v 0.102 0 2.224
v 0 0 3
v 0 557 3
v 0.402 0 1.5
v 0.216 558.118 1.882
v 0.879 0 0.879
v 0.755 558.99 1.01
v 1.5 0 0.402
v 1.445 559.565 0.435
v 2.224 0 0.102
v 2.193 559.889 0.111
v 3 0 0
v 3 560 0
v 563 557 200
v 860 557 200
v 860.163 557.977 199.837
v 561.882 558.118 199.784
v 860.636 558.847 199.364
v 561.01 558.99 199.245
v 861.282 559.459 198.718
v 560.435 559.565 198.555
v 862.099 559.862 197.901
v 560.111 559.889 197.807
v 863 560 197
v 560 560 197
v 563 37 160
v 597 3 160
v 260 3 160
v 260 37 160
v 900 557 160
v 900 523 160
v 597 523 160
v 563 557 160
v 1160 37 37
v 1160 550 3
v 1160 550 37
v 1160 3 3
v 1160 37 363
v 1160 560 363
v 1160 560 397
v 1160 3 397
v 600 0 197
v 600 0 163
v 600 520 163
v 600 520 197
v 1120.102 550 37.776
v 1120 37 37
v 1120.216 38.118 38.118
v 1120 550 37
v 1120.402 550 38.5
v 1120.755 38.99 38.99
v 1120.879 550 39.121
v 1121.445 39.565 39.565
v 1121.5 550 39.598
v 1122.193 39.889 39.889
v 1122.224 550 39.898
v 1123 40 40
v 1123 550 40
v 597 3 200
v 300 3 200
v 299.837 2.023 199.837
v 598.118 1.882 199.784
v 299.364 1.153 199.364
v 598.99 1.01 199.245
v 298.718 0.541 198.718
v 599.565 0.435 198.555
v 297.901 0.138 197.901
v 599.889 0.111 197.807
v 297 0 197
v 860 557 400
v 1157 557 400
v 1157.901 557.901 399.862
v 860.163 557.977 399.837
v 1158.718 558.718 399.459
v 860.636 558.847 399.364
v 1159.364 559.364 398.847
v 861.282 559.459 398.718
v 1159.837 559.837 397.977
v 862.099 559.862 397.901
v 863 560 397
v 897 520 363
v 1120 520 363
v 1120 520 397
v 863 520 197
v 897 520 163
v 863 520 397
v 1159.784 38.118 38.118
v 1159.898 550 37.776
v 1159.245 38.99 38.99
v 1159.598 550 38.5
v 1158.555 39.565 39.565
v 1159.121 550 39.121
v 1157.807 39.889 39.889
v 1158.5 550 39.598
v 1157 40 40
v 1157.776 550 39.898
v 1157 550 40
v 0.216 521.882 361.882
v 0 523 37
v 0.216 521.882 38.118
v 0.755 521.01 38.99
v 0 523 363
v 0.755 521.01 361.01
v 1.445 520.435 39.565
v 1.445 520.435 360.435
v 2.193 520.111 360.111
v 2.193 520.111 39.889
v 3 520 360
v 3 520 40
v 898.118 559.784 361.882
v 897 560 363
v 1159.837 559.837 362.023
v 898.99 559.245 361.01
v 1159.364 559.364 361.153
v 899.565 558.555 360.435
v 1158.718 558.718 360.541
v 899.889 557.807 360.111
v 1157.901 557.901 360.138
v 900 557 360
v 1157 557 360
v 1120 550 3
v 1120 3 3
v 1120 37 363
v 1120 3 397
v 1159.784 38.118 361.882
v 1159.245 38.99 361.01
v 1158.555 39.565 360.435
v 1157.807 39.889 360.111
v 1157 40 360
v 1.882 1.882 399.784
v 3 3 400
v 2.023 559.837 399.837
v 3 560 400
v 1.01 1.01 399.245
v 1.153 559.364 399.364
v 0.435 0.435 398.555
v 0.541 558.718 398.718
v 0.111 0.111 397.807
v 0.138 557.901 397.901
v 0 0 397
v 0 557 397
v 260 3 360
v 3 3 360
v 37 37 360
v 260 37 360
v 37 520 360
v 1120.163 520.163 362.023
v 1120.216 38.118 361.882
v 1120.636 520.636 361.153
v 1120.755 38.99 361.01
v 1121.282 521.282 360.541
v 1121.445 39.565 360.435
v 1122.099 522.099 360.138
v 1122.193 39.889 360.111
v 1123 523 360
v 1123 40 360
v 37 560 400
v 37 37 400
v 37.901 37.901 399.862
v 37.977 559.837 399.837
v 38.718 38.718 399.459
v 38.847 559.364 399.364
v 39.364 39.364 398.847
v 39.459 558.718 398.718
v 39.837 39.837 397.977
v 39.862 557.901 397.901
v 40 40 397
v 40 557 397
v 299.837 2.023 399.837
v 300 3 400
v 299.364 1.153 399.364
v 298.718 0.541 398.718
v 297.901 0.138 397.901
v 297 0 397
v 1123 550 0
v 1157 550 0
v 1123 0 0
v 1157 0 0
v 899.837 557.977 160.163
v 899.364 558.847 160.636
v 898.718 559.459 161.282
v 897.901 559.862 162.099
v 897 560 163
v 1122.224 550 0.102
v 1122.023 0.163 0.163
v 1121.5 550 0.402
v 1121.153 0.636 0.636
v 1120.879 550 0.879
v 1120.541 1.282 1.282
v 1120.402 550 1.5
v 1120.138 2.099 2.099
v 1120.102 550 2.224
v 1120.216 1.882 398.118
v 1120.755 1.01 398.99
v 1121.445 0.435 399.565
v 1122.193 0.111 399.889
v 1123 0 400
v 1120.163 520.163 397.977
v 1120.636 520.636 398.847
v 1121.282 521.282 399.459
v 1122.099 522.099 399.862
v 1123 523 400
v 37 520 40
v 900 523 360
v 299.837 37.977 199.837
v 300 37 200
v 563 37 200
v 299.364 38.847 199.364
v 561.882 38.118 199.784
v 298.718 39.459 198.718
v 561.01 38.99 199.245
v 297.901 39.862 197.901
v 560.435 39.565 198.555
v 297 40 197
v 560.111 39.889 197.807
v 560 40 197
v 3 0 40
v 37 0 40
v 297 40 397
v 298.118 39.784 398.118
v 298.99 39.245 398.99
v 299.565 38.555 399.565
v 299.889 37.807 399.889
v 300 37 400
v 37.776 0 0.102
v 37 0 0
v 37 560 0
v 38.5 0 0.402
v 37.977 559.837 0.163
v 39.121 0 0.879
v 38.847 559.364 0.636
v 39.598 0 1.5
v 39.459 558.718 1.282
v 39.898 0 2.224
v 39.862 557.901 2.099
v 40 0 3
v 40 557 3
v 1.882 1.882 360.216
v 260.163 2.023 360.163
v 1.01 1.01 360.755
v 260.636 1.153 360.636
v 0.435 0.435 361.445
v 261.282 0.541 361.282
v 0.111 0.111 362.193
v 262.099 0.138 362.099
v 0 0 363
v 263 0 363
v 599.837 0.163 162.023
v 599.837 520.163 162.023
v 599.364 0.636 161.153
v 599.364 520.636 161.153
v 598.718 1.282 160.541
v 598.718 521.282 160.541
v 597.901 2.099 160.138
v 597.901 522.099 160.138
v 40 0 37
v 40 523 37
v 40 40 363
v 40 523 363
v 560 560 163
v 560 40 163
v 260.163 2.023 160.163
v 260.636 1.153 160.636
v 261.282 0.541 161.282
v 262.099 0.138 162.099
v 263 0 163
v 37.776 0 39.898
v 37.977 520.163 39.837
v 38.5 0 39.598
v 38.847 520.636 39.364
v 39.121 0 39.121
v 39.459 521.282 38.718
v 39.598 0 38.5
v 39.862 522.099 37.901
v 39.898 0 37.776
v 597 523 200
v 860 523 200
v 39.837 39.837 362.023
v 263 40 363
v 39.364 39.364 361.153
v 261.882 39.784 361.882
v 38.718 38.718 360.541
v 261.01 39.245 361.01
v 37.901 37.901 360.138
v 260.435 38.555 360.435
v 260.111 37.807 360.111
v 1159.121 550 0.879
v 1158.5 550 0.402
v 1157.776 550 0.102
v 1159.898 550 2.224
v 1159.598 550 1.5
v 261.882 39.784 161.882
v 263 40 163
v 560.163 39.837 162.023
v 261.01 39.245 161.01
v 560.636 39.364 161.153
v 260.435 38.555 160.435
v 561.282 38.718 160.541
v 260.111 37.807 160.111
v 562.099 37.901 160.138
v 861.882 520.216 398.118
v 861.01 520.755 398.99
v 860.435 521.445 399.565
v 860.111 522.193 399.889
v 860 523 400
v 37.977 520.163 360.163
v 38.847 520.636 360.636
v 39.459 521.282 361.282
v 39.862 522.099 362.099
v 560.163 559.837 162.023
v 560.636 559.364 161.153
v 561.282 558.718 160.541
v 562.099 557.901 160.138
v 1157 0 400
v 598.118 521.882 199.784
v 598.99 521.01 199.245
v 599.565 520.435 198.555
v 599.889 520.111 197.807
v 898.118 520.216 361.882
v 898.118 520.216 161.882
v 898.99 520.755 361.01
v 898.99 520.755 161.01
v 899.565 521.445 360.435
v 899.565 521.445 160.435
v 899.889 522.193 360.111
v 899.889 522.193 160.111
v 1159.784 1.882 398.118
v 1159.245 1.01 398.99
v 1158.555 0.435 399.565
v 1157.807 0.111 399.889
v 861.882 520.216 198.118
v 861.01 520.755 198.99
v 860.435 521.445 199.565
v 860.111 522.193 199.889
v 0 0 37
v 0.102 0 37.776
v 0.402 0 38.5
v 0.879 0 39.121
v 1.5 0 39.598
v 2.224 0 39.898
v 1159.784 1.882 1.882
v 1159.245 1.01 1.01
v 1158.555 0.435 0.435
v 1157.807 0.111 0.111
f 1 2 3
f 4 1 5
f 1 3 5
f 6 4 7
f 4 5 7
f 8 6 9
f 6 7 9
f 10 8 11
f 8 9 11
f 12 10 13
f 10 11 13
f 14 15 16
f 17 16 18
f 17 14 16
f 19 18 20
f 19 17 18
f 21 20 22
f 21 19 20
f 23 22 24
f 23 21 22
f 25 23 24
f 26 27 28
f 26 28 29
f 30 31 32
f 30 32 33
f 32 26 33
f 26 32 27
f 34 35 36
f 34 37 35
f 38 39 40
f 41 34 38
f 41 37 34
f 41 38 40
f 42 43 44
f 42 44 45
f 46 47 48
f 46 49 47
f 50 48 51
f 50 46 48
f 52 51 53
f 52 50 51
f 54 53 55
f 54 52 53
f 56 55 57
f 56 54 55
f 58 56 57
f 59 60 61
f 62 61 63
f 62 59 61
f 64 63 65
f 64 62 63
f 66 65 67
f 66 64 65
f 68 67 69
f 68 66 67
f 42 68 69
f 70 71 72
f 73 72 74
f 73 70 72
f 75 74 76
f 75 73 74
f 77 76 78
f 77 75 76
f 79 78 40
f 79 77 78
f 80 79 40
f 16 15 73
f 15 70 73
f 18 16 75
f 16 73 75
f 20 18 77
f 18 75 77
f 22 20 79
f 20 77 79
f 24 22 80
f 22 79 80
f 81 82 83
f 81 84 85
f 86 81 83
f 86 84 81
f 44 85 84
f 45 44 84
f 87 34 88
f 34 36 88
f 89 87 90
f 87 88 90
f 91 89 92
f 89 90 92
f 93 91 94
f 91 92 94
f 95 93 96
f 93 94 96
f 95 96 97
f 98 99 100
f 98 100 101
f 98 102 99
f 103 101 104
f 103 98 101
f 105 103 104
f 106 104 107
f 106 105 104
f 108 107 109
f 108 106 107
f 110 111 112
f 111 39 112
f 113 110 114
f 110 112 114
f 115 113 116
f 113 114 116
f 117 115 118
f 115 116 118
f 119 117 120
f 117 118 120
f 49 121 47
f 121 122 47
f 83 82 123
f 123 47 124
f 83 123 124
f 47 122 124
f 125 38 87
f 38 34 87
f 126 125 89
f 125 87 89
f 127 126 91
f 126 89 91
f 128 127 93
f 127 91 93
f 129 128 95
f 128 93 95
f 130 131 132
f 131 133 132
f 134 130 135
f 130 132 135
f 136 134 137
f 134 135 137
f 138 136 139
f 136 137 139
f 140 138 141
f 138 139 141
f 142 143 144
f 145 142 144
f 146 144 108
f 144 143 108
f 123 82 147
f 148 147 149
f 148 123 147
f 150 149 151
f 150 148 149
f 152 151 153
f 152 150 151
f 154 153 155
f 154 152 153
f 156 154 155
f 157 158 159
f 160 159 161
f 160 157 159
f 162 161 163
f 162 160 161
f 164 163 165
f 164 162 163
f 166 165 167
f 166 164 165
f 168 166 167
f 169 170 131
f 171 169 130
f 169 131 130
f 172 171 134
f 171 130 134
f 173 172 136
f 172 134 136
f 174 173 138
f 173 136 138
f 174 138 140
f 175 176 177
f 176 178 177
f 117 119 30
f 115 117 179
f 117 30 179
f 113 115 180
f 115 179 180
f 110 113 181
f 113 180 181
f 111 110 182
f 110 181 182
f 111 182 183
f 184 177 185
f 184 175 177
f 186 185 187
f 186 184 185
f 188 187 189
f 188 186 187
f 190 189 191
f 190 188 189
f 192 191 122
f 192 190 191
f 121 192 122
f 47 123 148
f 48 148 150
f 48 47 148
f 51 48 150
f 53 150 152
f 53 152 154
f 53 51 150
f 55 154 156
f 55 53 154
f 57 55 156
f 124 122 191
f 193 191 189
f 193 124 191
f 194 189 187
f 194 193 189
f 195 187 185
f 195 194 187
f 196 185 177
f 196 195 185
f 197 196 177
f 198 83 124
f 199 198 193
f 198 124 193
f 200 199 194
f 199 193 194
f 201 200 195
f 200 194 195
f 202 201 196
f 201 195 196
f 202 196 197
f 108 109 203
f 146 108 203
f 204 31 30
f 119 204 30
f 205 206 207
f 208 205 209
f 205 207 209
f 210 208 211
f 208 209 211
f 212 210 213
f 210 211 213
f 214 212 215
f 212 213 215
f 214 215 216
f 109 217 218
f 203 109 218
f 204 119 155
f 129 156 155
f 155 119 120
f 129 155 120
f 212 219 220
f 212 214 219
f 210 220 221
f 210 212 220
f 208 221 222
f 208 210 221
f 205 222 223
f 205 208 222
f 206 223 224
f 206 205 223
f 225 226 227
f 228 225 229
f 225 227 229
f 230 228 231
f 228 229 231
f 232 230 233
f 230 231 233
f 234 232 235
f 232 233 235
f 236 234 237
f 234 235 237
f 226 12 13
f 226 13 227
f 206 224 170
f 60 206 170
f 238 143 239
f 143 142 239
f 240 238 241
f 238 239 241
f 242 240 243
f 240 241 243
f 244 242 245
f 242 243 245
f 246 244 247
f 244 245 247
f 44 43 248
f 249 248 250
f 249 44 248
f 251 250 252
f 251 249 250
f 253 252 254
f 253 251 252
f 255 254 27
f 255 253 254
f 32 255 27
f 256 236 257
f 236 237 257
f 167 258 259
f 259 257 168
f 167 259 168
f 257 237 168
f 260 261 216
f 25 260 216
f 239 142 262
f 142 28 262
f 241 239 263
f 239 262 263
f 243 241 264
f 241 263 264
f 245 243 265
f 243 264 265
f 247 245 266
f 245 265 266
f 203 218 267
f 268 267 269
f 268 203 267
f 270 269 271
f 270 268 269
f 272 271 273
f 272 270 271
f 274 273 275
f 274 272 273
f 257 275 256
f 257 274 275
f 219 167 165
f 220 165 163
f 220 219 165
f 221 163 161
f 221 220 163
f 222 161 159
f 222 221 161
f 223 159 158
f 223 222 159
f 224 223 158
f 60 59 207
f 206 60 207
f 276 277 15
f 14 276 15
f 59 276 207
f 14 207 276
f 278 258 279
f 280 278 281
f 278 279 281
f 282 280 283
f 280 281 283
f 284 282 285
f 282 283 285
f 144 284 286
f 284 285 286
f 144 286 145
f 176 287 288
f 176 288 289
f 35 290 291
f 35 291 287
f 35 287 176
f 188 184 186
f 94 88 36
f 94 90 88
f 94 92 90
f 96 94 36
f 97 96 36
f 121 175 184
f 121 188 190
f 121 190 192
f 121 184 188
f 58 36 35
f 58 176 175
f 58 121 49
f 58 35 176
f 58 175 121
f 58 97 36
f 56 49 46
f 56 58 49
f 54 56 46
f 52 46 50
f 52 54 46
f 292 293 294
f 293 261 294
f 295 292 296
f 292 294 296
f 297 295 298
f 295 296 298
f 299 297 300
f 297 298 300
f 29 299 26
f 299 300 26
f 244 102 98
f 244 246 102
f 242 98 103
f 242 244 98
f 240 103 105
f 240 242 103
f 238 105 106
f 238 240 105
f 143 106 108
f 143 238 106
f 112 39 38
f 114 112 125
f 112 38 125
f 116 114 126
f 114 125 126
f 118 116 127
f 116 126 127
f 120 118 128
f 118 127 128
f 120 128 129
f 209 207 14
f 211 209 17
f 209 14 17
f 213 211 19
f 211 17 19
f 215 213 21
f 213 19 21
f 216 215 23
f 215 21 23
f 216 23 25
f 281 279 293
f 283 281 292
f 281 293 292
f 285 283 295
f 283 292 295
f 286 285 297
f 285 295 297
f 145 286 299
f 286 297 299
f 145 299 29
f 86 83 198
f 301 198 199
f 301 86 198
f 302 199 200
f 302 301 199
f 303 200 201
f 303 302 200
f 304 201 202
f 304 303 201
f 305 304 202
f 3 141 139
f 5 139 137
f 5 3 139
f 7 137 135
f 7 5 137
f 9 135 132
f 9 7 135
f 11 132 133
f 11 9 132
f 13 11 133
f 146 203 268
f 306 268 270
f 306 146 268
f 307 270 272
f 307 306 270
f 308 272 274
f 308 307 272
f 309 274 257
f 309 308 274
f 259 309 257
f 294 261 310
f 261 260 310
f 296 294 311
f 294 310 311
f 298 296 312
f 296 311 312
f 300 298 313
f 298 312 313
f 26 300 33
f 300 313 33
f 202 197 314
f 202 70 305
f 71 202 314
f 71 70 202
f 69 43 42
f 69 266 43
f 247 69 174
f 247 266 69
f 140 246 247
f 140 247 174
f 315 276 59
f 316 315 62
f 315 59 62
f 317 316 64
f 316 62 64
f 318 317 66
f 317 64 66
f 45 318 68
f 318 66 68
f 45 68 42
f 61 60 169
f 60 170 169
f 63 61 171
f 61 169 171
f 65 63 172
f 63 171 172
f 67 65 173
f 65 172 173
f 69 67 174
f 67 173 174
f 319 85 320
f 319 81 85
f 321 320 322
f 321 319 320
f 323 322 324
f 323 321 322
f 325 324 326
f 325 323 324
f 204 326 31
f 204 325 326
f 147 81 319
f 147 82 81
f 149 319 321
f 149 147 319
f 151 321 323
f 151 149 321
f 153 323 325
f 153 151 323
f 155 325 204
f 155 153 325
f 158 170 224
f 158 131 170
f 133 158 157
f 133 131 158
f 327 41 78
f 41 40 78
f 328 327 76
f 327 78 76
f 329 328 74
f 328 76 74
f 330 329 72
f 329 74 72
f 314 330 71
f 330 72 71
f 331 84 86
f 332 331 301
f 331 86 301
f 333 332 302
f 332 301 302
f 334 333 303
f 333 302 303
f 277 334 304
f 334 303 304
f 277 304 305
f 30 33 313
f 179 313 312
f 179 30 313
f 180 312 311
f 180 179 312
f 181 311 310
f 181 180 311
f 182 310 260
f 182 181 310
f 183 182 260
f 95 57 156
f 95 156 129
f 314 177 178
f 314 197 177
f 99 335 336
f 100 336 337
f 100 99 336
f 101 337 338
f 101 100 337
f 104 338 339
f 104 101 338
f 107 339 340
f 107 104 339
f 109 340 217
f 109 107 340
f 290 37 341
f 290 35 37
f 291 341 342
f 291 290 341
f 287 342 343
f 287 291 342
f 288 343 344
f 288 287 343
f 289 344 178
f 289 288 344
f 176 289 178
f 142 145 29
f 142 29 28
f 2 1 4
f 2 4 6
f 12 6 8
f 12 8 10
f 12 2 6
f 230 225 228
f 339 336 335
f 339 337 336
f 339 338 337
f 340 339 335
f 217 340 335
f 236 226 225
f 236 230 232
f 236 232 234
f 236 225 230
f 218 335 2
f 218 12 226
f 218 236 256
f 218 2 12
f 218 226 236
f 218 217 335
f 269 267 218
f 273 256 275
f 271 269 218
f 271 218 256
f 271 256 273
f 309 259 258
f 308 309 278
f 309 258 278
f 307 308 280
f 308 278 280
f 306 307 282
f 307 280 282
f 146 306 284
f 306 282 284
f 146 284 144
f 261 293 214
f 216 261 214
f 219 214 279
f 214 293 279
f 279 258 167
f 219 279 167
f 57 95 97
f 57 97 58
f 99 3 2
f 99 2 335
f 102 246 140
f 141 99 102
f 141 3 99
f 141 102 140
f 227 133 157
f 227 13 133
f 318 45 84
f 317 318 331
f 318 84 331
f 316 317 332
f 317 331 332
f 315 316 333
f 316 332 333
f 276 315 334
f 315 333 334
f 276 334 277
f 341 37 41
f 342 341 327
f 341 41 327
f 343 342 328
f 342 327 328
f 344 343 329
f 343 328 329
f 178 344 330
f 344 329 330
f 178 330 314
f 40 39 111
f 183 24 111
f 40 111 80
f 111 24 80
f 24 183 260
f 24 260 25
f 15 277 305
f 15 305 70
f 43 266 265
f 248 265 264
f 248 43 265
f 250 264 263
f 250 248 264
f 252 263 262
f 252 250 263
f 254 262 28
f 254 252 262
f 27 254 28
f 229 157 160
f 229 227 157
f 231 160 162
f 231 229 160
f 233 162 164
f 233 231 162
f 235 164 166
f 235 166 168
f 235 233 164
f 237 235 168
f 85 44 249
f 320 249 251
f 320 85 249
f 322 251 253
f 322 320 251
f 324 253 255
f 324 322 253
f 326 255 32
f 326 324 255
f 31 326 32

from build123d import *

# Parameters (mm, degrees)
F0_W      = 40
F0_H      = 40
F1_DEPTH  = 560
F2_W      = 40
F2_H      = 40
F3_DEPTH  = 360
F4_W      = 40
F4_H      = 40
F5_DEPTH  = 520
F6_W      = 40
F6_H      = 40
F7_DEPTH  = 260
F8_W      = 40
F8_H      = 40
F9_DEPTH  = 200
F10_W     = 40
F10_H     = 40
F11_DEPTH = 300
F12_W     = 40
F12_H     = 40
F13_DEPTH = 520
F14_W     = 40
F14_H     = 40
F15_DEPTH = 300
F16_W     = 40
F16_H     = 40
F17_DEPTH = 200
F18_W     = 40
F18_H     = 40
F19_DEPTH = 260
F20_W     = 40
F20_H     = 40
F21_DEPTH = 520
F22_W     = 40
F22_H     = 40
F23_DEPTH = 360
F24_W     = 40
F24_H     = 40
F25_DEPTH = 510
F26_R     = 3


with BuildPart() as f1:
    # F0 (on Front) → F1 (new body)
    with BuildSketch(Plane.XZ):
        with Locations((20, 20)):
            Rectangle(F0_W, F0_H)
    extrude(amount=-F1_DEPTH)

    # F2 (on face) → F3 (join)
    with BuildSketch(Plane.XY.offset(40)):
        with Locations((20, 540)):
            Rectangle(F2_W, F2_H)
    extrude(amount=F3_DEPTH)

    # F4 (on face) → F5 (join)
    with BuildSketch(Plane.XZ.offset(-520)):
        with Locations((20, 380)):
            Rectangle(F4_W, F4_H)
    extrude(amount=F5_DEPTH)

    # F6 (on face) → F7 (join)
    with BuildSketch(Plane.YZ.offset(40)):
        with Locations((20, 380)):
            Rectangle(F6_W, F6_H)
    extrude(amount=F7_DEPTH)

    # F8 (on face) → F9 (join)
    with BuildSketch(Plane(origin=(0, 0, 360), x_dir=(1, 0, 0), z_dir=(0, 0, -1))):
        with Locations((280, -20)):
            Rectangle(F8_W, F8_H)
    extrude(amount=F9_DEPTH)

    # F10 (on face) → F11 (join)
    with BuildSketch(Plane.YZ.offset(300)):
        with Locations((20, 180)):
            Rectangle(F10_W, F10_H)
    extrude(amount=F11_DEPTH)

    # F12 (on face) → F13 (join)
    with BuildSketch(Plane(origin=(0, 40, 0), x_dir=(-1, 0, 0), z_dir=(0, 1, 0))):
        with Locations((-580, 180)):
            Rectangle(F12_W, F12_H)
    extrude(amount=F13_DEPTH)

    # F14 (on face) → F15 (join)
    with BuildSketch(Plane.YZ.offset(600)):
        with Locations((540, 180)):
            Rectangle(F14_W, F14_H)
    extrude(amount=F15_DEPTH)

    # F16 (on face) → F17 (join)
    with BuildSketch(Plane.XY.offset(200)):
        with Locations((880, 540)):
            Rectangle(F16_W, F16_H)
    extrude(amount=F17_DEPTH)

    # F18 (on face) → F19 (join)
    with BuildSketch(Plane.YZ.offset(900)):
        with Locations((540, 380)):
            Rectangle(F18_W, F18_H)
    extrude(amount=F19_DEPTH)

    # F20 (on face) → F21 (join)
    with BuildSketch(Plane.XZ.offset(-520)):
        with Locations((1140, 380)):
            Rectangle(F20_W, F20_H)
    extrude(amount=F21_DEPTH)

    # F22 (on face) → F23 (join)
    with BuildSketch(Plane(origin=(0, 0, 360), x_dir=(1, 0, 0), z_dir=(0, 0, -1))):
        with Locations((1140, -20)):
            Rectangle(F22_W, F22_H)
    extrude(amount=F23_DEPTH)

    # F24 (on face) → F25 (join)
    with BuildSketch(Plane(origin=(0, 40, 0), x_dir=(-1, 0, 0), z_dir=(0, 1, 0))):
        with Locations((-1140, 20)):
            Rectangle(F24_W, F24_H)
    extrude(amount=F25_DEPTH)

    # F26
    f26_edges = [f1.edges().sort_by_distance(p)[0] for p in [
        (0, 280, 400),
        (150, 0, 400),
        (170, 40, 400),
        (40, 300, 400),
        (0, 260, 40),
        (130, 0, 360),
        (260, 0, 260),
        (300, 0, 300),
        (430, 40, 200),
        (450, 0, 200),
        (430, 0, 160),
        (40, 520, 200),
        (0, 560, 200),
        (0, 280, 0),
        (40, 260, 40),
        (560, 300, 200),
        (600, 260, 200),
        (710, 560, 200),
        (730, 520, 200),
        (750, 520, 160),
        (560, 300, 160),
        (1120, 275, 0),
        (1160, 295, 40),
        (1120, 295, 40),
        (1120, 40, 200),
        (1160, 0, 200),
        (1120, 0, 200),
        (1120, 280, 360),
        (1160, 280, 400),
        (1120, 260, 400),
        (1010, 560, 400),
        (990, 520, 400),
        (1010, 520, 360),
        (900, 520, 260),
        (860, 520, 300),
        (860, 560, 300),
        (1160, 300, 360),
        (1160, 275, 0),
        (1030, 560, 360),
        (730, 560, 160),
        (900, 560, 260),
        (600, 260, 160),
        (410, 40, 160),
        (150, 40, 360),
        (300, 40, 300),
        (1160, 40, 200),
        (40, 560, 200),
        (40, 280, 0),
        (0, 520, 200),
        (0, 260, 360),
        (40, 280, 360),
        (260, 40, 260),
    ]]
    fillet(f26_edges, radius=F26_R)


solid = f1.part
